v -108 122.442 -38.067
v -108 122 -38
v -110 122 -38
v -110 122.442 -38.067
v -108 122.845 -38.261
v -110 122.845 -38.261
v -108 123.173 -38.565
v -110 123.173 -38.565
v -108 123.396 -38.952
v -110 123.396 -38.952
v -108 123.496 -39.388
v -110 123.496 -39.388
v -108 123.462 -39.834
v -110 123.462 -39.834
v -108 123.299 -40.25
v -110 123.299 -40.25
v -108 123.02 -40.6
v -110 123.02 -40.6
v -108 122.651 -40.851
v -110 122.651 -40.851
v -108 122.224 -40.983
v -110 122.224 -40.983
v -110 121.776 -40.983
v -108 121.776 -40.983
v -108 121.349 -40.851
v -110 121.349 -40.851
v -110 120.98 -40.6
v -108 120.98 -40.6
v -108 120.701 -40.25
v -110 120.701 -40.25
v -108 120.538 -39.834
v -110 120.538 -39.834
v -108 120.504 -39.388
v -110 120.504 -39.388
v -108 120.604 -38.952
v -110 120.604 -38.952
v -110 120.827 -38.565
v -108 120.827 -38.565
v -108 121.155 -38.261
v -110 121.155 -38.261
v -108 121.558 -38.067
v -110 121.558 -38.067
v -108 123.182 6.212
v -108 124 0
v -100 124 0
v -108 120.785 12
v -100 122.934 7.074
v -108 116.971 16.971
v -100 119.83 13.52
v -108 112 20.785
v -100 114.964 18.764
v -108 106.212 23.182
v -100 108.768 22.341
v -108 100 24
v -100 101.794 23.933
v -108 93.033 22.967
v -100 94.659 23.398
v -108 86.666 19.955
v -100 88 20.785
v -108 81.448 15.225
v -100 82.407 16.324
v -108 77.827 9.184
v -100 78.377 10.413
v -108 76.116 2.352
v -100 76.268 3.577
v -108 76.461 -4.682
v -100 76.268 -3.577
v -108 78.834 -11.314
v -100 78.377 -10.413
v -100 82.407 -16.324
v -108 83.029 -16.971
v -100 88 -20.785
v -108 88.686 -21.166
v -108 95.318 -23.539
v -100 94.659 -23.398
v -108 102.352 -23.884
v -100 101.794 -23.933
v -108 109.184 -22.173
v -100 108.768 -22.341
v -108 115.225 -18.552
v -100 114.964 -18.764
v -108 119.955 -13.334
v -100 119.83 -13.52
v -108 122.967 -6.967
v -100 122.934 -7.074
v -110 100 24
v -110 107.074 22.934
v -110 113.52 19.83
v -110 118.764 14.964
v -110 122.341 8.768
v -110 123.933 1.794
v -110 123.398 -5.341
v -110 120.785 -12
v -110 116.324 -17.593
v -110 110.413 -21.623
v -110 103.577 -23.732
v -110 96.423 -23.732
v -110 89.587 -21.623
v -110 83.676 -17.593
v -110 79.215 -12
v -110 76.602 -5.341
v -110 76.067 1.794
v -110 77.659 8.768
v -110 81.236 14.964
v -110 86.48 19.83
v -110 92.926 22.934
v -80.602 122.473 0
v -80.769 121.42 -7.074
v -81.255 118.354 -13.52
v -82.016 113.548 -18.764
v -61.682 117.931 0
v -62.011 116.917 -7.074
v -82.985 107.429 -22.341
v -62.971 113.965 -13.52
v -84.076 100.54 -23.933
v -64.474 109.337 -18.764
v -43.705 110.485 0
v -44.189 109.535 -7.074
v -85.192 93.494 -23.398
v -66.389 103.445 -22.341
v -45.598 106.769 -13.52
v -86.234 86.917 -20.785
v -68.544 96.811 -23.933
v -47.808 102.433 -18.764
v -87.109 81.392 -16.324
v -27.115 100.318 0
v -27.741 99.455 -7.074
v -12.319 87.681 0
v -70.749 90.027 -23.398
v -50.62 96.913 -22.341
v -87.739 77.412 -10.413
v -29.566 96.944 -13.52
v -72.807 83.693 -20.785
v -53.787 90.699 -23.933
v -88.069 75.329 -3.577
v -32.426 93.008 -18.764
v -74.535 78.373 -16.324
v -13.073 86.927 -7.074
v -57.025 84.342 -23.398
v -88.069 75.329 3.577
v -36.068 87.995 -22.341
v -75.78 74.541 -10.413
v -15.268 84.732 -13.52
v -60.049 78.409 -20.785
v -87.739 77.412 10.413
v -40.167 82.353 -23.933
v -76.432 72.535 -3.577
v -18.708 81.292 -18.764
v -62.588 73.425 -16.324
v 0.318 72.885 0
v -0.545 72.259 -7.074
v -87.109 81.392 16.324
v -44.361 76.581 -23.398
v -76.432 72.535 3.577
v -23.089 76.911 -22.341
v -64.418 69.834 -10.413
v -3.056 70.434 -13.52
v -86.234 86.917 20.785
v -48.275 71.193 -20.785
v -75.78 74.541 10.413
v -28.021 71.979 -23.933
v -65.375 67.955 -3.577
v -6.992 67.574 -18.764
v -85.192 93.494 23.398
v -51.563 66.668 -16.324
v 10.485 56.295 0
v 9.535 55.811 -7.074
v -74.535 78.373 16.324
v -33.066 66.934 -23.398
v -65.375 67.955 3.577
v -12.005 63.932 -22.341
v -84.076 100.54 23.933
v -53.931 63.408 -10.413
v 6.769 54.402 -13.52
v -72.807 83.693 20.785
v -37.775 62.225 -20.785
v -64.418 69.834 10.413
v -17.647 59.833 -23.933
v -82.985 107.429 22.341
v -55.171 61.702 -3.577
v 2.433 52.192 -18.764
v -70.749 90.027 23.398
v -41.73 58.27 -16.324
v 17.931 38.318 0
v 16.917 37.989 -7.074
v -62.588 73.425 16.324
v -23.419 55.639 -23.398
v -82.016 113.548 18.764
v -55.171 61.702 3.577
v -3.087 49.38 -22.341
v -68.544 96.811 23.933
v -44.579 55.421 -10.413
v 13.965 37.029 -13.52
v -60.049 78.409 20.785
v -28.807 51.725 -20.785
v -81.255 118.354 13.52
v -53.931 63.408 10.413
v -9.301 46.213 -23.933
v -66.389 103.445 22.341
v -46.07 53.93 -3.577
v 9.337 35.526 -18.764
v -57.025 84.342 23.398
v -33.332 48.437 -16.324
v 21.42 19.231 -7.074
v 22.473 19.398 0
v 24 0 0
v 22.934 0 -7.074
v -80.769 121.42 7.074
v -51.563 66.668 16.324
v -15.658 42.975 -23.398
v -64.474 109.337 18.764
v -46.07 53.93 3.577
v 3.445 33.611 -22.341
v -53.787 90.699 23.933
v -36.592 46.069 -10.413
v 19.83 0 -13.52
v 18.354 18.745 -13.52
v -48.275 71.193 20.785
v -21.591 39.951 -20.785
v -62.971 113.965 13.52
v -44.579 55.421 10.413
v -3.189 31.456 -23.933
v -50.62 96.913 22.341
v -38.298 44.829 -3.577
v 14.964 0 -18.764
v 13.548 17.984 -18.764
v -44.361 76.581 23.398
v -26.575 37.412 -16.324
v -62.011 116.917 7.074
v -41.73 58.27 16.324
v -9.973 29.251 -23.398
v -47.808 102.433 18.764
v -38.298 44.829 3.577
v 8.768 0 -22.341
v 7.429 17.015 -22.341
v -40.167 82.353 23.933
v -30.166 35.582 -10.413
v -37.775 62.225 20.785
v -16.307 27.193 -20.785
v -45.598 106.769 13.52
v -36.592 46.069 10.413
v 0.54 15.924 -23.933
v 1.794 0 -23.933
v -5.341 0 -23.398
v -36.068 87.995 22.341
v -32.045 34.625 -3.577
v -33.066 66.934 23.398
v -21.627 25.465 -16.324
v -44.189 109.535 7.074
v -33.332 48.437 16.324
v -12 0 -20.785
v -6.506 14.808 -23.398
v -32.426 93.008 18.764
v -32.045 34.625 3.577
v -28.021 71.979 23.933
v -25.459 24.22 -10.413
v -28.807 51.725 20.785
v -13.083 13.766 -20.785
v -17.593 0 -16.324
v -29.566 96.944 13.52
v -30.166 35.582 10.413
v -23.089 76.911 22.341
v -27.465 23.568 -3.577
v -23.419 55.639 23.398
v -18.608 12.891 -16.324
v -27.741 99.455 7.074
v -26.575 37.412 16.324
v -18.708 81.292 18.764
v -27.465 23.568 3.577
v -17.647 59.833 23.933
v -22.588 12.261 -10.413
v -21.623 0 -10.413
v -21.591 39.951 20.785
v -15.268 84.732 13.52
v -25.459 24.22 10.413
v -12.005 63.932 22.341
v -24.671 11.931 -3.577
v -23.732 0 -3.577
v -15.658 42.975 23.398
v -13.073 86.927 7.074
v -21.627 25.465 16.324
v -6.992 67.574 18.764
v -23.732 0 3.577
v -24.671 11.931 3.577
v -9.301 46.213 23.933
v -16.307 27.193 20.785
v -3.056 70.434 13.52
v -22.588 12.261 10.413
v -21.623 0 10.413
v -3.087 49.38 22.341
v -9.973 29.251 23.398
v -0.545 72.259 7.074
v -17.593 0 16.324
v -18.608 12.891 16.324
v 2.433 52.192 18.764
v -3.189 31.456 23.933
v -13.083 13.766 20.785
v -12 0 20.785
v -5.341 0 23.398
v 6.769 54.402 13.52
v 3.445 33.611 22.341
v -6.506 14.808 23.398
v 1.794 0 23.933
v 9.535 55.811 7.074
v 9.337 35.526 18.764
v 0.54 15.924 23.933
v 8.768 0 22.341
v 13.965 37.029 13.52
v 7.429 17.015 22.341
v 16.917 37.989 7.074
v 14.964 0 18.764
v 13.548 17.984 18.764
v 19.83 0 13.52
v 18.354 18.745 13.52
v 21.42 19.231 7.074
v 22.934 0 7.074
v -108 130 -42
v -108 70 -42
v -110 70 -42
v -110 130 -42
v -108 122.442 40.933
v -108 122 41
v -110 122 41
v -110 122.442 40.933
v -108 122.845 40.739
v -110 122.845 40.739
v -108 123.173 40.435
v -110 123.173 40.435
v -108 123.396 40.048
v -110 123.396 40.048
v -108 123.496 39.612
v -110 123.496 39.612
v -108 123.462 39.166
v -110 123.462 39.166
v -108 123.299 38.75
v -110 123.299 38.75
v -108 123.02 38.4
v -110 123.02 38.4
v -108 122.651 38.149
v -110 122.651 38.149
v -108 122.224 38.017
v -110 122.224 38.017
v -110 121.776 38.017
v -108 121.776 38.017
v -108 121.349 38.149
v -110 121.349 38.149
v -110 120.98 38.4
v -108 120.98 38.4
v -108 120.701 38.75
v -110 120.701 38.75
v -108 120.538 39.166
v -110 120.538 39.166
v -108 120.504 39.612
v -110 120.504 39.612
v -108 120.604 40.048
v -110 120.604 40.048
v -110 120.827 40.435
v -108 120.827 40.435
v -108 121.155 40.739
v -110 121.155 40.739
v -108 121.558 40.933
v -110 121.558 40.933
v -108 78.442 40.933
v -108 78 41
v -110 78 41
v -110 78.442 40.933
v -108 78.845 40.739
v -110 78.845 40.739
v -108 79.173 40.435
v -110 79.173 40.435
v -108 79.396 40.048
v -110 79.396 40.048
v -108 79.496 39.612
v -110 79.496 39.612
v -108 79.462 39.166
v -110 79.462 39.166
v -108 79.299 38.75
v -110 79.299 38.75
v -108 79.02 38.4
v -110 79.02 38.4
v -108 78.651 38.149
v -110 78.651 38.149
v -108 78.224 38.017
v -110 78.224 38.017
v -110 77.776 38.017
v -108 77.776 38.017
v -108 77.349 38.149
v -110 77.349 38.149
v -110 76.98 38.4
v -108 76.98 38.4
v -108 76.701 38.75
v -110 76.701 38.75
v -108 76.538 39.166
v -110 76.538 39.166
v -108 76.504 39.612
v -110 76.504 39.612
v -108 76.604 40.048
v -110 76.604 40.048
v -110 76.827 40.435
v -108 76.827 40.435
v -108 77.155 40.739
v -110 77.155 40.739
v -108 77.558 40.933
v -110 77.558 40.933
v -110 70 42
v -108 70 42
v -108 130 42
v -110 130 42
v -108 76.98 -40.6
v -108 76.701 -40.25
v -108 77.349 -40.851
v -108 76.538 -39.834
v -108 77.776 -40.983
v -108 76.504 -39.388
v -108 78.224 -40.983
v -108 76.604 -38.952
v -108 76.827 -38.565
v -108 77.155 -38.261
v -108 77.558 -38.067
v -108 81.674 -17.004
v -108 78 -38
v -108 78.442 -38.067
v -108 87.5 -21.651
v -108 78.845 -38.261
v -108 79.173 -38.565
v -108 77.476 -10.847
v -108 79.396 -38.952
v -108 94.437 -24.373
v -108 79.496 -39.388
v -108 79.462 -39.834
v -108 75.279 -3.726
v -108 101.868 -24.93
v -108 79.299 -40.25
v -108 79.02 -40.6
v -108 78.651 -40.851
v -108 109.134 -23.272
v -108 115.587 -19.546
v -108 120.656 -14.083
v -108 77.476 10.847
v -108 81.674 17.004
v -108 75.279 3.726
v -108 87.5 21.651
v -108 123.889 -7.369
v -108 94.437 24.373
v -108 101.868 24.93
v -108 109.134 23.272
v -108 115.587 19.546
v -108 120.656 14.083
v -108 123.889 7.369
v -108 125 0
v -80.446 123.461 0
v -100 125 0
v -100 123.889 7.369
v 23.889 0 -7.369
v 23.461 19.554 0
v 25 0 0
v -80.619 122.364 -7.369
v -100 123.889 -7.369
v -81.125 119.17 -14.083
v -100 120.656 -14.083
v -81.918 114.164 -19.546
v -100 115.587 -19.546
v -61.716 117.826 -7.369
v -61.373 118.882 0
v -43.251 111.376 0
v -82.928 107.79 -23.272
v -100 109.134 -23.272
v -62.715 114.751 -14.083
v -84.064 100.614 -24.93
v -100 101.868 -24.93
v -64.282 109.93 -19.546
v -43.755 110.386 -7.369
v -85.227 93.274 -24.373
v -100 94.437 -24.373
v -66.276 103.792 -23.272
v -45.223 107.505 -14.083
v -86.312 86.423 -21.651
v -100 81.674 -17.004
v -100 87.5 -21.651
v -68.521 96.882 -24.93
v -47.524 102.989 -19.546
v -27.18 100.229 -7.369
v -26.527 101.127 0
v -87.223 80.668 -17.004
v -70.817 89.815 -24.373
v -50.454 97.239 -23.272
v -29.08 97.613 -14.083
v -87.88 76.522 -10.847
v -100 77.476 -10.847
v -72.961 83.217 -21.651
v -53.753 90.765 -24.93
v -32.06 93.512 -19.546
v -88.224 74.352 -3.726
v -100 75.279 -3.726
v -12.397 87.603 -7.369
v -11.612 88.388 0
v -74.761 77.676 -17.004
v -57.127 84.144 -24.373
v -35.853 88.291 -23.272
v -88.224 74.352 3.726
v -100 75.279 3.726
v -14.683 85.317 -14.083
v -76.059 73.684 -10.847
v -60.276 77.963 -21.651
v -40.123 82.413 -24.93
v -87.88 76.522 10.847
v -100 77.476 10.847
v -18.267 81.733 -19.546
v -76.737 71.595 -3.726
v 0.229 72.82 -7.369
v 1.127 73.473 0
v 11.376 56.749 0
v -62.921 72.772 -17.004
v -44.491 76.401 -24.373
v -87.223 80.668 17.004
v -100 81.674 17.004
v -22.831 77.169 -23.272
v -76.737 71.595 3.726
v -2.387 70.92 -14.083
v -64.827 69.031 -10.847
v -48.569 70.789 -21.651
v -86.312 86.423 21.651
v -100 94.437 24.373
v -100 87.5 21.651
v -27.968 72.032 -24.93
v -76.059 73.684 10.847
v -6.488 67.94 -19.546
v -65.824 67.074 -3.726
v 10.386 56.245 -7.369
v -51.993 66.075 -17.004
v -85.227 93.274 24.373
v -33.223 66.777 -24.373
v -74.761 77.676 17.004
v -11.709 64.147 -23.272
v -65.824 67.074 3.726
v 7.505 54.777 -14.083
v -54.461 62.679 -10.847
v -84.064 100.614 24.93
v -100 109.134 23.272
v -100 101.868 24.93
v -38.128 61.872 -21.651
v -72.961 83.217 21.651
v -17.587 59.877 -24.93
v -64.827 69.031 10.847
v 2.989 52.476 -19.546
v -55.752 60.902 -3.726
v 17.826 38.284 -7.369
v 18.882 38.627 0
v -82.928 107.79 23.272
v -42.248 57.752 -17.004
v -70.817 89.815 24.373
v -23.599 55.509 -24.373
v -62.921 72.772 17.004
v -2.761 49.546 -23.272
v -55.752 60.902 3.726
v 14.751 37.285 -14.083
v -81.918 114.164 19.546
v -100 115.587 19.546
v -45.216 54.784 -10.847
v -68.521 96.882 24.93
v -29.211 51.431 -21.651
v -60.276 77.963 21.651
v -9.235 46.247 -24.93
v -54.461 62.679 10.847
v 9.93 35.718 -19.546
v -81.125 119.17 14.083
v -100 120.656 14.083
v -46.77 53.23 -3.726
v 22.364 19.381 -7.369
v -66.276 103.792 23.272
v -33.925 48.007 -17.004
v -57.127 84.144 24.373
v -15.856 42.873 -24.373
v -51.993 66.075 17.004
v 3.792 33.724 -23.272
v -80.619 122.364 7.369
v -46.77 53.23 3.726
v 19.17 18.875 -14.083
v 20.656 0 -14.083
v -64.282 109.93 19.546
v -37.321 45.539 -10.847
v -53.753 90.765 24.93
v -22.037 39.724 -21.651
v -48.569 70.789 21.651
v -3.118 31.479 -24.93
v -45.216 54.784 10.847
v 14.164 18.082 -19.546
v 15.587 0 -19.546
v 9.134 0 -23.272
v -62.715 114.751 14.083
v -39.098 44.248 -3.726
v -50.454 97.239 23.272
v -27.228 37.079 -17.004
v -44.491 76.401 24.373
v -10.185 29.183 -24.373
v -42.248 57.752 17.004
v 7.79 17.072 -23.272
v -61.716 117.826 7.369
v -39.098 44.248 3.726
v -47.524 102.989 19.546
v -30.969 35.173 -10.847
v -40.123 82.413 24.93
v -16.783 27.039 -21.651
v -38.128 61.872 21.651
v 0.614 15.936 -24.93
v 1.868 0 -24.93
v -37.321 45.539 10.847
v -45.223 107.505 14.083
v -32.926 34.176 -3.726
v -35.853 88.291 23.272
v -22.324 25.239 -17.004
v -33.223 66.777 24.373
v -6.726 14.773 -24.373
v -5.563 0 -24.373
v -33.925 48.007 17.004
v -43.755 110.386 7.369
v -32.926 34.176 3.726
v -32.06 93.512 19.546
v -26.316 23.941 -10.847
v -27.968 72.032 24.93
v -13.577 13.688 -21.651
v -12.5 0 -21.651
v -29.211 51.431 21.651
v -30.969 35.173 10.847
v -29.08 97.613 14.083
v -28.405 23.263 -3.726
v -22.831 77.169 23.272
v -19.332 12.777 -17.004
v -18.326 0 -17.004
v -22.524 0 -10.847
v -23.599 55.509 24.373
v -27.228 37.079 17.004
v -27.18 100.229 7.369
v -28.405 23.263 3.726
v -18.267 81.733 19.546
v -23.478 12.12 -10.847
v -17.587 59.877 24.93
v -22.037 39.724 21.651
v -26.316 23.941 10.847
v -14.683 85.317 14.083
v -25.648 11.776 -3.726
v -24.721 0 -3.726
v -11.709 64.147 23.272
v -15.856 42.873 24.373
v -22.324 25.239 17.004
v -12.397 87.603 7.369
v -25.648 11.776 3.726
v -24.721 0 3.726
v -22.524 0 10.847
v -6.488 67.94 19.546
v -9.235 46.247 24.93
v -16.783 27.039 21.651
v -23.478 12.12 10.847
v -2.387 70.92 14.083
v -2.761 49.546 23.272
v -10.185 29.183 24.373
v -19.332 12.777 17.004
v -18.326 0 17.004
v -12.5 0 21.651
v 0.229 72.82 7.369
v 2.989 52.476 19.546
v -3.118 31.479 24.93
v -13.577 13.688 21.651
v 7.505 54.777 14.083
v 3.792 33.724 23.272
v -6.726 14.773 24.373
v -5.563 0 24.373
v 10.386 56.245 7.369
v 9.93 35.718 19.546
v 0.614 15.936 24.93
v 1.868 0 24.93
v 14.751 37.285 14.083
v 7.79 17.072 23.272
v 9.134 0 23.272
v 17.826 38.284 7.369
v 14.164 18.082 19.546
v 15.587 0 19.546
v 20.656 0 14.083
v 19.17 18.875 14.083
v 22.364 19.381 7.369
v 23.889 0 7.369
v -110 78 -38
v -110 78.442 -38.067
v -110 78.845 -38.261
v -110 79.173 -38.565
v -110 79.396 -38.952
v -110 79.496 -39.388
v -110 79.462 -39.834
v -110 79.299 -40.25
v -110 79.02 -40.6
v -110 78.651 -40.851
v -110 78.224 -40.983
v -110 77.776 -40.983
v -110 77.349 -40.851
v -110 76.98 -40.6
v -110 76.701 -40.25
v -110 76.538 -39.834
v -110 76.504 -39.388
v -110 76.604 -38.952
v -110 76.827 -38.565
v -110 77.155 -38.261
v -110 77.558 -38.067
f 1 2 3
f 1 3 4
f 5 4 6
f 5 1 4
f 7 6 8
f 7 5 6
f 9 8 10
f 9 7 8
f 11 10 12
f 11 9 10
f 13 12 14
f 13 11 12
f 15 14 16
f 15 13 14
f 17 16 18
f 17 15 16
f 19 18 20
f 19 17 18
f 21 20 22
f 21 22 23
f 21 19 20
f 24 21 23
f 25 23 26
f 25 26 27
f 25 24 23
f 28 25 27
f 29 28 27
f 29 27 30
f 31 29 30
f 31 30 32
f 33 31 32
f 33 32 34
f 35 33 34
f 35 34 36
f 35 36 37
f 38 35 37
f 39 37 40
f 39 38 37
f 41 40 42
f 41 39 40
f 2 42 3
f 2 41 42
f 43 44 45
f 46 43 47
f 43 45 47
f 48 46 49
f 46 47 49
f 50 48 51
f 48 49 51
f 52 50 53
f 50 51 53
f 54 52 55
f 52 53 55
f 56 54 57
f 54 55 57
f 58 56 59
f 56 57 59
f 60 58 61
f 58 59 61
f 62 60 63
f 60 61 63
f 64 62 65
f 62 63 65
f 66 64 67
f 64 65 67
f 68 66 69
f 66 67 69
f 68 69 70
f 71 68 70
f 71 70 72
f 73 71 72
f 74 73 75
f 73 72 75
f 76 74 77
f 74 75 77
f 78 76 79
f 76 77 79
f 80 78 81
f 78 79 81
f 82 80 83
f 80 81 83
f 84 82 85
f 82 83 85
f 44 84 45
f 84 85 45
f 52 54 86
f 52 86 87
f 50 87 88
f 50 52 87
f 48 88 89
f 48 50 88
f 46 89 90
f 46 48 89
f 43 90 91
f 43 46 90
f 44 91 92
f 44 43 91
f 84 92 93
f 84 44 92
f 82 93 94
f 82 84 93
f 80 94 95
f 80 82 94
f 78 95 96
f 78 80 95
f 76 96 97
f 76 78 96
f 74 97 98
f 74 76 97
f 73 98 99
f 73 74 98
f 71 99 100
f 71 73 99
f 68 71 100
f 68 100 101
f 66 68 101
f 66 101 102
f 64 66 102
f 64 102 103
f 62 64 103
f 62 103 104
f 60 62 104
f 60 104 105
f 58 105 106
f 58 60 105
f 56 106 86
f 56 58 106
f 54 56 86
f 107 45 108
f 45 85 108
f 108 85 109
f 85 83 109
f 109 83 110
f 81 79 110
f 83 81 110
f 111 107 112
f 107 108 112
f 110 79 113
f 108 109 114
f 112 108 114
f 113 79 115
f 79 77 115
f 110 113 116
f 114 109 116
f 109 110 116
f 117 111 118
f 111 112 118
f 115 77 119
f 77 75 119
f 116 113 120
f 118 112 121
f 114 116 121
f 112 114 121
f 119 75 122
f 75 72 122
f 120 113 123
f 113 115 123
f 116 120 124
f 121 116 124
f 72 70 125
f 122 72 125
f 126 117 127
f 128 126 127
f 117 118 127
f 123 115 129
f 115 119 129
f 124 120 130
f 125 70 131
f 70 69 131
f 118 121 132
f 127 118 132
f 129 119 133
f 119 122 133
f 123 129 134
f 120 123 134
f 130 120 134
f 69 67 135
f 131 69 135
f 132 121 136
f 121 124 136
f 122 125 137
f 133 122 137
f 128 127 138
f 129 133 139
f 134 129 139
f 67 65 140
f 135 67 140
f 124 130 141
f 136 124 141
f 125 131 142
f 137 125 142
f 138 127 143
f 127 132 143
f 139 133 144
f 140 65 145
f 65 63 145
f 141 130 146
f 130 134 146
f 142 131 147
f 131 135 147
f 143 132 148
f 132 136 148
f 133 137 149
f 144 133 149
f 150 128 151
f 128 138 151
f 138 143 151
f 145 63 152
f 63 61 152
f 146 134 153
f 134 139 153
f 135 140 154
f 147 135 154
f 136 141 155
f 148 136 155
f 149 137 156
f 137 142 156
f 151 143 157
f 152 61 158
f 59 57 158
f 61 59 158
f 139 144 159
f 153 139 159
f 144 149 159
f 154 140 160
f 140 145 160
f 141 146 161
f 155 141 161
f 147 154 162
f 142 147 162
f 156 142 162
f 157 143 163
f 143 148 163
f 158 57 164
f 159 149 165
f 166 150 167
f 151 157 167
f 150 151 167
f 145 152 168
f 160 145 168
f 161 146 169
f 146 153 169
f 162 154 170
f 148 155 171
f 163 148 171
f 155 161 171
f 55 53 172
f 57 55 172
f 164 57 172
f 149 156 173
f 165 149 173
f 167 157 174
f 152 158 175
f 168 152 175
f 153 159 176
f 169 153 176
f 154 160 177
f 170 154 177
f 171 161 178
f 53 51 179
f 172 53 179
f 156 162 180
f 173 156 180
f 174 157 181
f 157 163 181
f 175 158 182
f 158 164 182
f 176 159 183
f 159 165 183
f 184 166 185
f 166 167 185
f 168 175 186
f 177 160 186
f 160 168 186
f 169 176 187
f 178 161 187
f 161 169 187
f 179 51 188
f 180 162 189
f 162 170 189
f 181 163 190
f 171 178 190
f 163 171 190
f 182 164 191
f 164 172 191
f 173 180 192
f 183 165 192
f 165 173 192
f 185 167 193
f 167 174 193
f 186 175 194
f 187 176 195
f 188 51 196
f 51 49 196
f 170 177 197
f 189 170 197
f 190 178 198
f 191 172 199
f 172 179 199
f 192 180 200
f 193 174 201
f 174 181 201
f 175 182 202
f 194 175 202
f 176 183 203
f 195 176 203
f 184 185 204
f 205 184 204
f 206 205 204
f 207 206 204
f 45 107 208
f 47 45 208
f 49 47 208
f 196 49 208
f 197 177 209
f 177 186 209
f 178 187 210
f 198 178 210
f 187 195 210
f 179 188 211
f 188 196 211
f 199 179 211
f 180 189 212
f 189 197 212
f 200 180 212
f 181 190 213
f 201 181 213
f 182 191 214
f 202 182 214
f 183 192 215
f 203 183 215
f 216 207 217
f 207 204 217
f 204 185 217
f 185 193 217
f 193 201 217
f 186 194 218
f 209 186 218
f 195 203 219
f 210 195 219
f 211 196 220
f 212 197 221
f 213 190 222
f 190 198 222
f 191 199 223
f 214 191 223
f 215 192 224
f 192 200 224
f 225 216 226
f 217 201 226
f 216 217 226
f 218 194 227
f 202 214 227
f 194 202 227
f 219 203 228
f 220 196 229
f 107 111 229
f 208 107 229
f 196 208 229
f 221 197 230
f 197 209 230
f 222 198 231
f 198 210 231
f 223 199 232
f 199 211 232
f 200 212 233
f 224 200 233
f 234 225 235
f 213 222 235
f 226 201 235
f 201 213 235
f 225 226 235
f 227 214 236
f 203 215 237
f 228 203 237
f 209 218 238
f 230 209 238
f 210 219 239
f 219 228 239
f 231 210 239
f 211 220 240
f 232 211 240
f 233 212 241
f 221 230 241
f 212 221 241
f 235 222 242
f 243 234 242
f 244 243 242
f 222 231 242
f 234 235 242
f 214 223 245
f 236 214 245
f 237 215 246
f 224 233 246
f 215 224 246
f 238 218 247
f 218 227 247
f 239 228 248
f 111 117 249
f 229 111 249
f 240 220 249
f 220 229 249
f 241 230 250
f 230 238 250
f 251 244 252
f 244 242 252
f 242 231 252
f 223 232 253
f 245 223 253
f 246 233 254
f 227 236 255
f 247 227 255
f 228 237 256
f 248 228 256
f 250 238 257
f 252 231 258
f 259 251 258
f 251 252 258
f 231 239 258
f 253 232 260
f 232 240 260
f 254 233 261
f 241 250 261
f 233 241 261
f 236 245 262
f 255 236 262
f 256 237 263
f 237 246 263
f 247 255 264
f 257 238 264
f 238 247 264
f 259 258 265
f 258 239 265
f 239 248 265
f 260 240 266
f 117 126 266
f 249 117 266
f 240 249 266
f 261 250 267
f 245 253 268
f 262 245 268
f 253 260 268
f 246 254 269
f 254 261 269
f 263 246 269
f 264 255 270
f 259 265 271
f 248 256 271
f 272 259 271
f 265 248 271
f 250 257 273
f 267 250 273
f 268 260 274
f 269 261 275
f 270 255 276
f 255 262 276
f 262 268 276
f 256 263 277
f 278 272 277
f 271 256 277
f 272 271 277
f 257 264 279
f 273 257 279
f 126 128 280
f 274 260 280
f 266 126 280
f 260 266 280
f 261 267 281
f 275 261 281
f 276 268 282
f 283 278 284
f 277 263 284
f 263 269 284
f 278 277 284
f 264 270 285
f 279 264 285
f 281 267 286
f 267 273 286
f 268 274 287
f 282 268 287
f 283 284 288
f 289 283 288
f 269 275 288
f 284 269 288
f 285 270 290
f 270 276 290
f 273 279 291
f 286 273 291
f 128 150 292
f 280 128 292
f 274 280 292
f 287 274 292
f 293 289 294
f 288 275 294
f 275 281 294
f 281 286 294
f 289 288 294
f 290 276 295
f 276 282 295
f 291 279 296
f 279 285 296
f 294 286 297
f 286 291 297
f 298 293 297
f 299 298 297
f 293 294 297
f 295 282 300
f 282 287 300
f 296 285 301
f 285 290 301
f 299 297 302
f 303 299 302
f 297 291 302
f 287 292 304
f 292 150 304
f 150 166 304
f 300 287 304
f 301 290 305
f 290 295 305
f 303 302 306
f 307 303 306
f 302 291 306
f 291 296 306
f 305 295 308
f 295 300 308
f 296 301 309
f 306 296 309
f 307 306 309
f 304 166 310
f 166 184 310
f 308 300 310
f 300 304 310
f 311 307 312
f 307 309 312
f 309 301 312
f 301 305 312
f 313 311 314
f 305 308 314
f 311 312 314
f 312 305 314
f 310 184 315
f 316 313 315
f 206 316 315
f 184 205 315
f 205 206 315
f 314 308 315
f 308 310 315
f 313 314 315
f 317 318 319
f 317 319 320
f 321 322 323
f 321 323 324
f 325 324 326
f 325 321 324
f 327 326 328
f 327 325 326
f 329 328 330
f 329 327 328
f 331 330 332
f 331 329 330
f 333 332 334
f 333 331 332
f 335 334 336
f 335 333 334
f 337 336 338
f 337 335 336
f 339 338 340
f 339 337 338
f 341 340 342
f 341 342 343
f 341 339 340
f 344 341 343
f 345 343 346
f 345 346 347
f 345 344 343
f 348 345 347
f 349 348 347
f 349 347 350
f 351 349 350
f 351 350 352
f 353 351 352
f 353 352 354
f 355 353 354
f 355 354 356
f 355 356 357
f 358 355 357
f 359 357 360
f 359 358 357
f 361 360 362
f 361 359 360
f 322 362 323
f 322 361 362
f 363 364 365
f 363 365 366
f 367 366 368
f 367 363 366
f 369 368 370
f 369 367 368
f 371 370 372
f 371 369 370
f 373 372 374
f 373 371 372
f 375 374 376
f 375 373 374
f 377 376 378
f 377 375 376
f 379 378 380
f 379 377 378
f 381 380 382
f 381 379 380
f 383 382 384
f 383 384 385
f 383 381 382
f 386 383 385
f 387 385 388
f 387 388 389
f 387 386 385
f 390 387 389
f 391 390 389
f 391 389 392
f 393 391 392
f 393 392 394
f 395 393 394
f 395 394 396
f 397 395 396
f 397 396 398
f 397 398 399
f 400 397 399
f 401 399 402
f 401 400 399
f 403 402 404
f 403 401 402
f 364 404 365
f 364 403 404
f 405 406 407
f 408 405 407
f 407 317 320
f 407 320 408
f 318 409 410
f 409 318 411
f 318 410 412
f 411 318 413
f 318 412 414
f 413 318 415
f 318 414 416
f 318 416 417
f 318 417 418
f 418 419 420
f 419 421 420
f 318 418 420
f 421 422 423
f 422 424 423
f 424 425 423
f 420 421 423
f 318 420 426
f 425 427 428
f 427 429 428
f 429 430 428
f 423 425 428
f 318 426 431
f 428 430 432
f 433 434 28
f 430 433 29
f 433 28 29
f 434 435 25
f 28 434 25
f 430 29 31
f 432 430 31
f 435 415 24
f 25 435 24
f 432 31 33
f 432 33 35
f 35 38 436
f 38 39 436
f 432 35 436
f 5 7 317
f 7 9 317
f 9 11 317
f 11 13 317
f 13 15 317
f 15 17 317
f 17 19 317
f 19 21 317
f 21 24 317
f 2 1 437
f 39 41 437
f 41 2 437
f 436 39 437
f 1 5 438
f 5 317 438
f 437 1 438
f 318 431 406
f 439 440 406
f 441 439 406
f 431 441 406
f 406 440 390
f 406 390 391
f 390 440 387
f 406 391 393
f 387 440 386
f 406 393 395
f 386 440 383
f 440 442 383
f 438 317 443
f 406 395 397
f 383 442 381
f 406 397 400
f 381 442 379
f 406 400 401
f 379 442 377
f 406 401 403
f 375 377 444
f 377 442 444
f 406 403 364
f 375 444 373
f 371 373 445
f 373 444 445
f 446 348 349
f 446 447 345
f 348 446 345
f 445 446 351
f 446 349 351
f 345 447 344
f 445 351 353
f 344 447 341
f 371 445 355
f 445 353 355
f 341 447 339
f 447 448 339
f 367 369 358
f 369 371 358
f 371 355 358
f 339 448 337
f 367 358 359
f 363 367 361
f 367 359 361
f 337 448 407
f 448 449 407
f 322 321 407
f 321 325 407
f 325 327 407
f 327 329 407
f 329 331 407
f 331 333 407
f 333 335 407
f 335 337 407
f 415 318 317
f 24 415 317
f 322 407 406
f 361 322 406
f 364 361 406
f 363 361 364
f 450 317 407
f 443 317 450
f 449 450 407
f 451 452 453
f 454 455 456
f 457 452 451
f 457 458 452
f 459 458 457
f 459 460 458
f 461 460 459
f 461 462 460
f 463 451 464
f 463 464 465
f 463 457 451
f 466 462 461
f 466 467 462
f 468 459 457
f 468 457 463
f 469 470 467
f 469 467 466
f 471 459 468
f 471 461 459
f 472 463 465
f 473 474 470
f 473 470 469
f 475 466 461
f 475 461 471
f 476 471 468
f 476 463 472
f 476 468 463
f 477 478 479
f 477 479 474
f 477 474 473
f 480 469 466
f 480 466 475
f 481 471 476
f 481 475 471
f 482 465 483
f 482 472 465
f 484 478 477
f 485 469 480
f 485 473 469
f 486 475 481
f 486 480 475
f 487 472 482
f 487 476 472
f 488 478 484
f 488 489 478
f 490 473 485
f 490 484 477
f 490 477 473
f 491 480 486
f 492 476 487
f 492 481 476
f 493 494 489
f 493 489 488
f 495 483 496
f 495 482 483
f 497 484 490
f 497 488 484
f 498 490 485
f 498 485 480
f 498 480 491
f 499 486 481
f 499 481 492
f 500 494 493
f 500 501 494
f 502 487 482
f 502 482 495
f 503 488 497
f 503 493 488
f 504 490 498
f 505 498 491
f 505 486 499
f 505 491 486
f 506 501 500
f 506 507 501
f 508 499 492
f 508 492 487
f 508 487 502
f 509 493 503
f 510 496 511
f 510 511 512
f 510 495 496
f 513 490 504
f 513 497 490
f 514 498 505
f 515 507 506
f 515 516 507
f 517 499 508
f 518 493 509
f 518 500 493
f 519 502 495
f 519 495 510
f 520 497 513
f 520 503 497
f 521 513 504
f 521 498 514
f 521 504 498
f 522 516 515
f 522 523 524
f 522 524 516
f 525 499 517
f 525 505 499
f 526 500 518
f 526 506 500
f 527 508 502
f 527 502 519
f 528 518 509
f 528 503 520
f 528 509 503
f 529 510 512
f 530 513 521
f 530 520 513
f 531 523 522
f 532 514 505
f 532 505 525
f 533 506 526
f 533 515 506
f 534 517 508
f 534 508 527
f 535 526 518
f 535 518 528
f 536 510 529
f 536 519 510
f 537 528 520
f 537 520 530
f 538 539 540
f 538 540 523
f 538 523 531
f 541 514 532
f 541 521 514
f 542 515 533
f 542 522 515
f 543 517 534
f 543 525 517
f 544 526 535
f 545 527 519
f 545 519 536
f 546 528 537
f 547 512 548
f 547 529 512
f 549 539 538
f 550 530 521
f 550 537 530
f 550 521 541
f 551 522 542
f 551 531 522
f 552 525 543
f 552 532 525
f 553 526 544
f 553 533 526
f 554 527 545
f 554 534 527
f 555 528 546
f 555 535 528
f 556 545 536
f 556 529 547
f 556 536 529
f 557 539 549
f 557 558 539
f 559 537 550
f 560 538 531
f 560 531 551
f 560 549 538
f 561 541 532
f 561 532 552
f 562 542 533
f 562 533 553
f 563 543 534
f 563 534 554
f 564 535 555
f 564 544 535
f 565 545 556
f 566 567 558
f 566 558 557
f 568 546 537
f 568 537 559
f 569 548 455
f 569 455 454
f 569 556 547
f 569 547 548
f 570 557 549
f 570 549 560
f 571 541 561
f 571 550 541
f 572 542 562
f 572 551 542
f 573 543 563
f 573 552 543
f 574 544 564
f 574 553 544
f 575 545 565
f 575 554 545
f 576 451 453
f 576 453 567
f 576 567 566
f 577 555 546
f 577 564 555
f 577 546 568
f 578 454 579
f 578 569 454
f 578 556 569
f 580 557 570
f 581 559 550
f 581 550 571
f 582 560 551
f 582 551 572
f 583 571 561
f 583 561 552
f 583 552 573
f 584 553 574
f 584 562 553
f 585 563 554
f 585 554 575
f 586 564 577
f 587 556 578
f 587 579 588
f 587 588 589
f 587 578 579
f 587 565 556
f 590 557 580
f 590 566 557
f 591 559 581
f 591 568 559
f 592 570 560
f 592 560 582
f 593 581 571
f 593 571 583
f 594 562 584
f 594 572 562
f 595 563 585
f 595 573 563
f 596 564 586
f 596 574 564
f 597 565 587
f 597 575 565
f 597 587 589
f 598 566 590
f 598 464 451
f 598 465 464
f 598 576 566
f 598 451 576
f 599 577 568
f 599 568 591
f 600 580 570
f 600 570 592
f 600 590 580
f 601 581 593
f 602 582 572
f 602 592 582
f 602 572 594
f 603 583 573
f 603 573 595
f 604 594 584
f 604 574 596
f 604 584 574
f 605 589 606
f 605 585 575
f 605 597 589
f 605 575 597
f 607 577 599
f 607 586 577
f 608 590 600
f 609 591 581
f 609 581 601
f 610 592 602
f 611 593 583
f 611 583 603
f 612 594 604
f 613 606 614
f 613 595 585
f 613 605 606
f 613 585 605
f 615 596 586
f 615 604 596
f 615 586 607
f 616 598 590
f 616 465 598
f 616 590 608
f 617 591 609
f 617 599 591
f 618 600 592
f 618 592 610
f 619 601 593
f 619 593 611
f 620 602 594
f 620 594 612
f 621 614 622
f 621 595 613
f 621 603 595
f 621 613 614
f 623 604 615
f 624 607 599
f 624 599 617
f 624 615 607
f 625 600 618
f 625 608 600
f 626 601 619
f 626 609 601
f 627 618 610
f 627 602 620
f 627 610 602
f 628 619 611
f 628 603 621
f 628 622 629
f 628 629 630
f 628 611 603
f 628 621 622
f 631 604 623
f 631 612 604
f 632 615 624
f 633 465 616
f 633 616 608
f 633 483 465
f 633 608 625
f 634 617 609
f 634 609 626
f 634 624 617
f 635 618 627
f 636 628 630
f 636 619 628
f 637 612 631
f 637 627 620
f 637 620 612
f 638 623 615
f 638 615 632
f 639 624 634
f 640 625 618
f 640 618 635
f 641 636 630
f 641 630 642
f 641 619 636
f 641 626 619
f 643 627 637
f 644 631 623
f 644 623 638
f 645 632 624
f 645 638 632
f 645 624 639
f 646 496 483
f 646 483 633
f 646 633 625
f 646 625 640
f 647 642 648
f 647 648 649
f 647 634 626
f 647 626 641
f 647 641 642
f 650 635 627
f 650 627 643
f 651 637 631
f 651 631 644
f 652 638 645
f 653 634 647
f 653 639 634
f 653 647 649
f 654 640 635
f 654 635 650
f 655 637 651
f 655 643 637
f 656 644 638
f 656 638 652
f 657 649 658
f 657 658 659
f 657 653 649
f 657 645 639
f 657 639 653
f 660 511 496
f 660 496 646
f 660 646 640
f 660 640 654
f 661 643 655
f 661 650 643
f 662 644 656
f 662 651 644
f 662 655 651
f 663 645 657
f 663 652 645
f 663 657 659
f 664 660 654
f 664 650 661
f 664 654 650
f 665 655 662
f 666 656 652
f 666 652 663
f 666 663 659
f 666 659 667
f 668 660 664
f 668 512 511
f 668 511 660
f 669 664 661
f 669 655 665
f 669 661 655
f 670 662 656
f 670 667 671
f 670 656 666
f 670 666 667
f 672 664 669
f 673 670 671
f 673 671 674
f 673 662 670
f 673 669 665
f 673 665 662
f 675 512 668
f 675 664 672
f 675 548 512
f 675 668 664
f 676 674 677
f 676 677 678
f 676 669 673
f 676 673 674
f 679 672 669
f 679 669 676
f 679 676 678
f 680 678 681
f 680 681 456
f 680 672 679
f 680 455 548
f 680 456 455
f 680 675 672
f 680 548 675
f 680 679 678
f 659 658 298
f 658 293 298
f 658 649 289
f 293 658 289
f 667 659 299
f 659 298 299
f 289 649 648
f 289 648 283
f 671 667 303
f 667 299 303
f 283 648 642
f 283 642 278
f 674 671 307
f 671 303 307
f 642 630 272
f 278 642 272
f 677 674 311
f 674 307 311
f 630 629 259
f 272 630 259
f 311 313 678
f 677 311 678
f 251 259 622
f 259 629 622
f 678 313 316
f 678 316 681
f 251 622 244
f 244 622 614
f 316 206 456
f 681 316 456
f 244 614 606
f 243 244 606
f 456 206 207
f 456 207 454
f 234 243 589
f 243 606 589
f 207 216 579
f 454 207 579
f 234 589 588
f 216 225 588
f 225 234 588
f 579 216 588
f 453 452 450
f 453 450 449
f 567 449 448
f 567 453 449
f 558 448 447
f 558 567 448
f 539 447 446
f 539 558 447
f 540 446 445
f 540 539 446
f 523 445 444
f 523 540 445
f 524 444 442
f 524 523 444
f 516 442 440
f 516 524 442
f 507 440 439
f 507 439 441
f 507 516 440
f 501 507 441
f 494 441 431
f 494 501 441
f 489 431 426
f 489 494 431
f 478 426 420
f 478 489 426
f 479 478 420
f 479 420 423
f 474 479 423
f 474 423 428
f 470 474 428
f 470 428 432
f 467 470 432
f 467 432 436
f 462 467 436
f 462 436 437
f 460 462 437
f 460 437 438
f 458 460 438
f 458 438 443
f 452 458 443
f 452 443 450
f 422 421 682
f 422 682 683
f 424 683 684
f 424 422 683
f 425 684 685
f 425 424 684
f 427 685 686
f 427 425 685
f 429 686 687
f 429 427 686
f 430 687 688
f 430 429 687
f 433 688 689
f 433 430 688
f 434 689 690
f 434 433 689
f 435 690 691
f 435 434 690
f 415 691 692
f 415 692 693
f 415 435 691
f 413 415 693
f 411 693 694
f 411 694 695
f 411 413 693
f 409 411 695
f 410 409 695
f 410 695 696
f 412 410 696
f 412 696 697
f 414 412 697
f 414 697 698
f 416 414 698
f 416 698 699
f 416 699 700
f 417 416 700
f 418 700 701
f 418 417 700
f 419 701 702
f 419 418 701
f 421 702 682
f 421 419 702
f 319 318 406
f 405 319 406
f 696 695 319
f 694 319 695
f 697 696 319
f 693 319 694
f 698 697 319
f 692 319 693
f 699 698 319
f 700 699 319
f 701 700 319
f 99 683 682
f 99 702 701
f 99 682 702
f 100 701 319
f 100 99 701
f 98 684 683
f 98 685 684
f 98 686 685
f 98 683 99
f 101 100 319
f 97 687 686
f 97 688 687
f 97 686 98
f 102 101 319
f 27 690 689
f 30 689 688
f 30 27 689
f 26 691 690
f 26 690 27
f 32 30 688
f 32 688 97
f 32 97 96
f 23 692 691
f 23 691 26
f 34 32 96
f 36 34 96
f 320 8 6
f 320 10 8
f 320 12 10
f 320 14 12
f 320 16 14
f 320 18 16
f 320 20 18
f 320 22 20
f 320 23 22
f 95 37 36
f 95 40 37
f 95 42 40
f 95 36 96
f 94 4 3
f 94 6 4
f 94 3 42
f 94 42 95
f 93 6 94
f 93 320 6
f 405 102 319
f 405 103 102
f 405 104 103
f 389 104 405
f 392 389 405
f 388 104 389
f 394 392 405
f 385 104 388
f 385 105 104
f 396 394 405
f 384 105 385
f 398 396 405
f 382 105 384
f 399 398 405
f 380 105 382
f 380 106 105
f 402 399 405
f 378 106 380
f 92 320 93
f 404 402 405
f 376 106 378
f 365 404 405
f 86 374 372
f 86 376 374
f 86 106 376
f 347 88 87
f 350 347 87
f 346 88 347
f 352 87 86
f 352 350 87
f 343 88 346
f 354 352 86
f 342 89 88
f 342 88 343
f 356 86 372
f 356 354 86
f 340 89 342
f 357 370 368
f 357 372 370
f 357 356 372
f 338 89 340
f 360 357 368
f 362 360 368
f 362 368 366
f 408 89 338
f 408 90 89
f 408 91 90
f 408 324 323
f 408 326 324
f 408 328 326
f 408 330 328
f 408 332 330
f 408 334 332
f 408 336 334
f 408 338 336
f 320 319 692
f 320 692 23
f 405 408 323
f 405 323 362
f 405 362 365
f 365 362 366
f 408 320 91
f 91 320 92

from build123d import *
from build123d.topology import SkipClean

# Parameters (mm, degrees)
IZIM2_R                     = 25
IZIM4_R                     = 24
IZIM5_W                     = 84
IZIM5_H                     = 60
IZIM5_R                     = 24
IZIM5_R_2                   = 1.5
Y_KSEKLIK_EKSTR_ZYON1_DEPTH = 2


with BuildPart() as part:
    # Süpür1: sweep along a path in Çizim1
    with BuildLine(Plane.XY) as s_p_r1_path:
        Line((-108, 100), (-100, 100))
        ThreePointArc((-100, 100), (-29.289321881, 70.710678119), (0, 0))
    # Çizim2 → Süpür1 (sweep)
    with BuildSketch(Plane(origin=(0, 0, 0), x_dir=(1, 0, 0), z_dir=(0, 1, 0))):
        Circle(IZIM2_R)
    sweep(path=s_p_r1_path.line)

    # Kes-Süpür1: sweep along a path in Çizim3
    with BuildLine(Plane.XY) as kes_s_p_r1_path:
        Line((-108, 100), (-100, 100))
        ThreePointArc((-100, 100), (-29.289321881, 70.710678119), (0, 0))
    # Çizim4 → Kes-Süpür1 (sweep, cut)
    with BuildSketch(Plane(origin=(0, 0, 0), x_dir=(1, 0, 0), z_dir=(0, 1, 0))):
        Circle(IZIM4_R)
    sweep(path=kes_s_p_r1_path.line, mode=Mode.SUBTRACT)

    # Çizim5 → Yükseklik-Ekstrüzyon1 (add)
    with SkipClean():  # the faces are left unmerged after this step: merging them gives an invalid solid
        with BuildSketch(Plane.ZY.offset(108)):
            with Locations((0, 100)):
                Rectangle(IZIM5_W, IZIM5_H)
            with Locations((0, 100)):
                Circle(IZIM5_R, mode=Mode.SUBTRACT)
            with Locations((-39.5, 122)):
                Circle(IZIM5_R_2, mode=Mode.SUBTRACT)
            with Locations((39.5, 122)):
                Circle(IZIM5_R_2, mode=Mode.SUBTRACT)
            with Locations((39.5, 78)):
                Circle(IZIM5_R_2, mode=Mode.SUBTRACT)
            with Locations((-39.5, 78)):
                Circle(IZIM5_R_2, mode=Mode.SUBTRACT)
        extrude(amount=Y_KSEKLIK_EKSTR_ZYON1_DEPTH)


solid = part.part
